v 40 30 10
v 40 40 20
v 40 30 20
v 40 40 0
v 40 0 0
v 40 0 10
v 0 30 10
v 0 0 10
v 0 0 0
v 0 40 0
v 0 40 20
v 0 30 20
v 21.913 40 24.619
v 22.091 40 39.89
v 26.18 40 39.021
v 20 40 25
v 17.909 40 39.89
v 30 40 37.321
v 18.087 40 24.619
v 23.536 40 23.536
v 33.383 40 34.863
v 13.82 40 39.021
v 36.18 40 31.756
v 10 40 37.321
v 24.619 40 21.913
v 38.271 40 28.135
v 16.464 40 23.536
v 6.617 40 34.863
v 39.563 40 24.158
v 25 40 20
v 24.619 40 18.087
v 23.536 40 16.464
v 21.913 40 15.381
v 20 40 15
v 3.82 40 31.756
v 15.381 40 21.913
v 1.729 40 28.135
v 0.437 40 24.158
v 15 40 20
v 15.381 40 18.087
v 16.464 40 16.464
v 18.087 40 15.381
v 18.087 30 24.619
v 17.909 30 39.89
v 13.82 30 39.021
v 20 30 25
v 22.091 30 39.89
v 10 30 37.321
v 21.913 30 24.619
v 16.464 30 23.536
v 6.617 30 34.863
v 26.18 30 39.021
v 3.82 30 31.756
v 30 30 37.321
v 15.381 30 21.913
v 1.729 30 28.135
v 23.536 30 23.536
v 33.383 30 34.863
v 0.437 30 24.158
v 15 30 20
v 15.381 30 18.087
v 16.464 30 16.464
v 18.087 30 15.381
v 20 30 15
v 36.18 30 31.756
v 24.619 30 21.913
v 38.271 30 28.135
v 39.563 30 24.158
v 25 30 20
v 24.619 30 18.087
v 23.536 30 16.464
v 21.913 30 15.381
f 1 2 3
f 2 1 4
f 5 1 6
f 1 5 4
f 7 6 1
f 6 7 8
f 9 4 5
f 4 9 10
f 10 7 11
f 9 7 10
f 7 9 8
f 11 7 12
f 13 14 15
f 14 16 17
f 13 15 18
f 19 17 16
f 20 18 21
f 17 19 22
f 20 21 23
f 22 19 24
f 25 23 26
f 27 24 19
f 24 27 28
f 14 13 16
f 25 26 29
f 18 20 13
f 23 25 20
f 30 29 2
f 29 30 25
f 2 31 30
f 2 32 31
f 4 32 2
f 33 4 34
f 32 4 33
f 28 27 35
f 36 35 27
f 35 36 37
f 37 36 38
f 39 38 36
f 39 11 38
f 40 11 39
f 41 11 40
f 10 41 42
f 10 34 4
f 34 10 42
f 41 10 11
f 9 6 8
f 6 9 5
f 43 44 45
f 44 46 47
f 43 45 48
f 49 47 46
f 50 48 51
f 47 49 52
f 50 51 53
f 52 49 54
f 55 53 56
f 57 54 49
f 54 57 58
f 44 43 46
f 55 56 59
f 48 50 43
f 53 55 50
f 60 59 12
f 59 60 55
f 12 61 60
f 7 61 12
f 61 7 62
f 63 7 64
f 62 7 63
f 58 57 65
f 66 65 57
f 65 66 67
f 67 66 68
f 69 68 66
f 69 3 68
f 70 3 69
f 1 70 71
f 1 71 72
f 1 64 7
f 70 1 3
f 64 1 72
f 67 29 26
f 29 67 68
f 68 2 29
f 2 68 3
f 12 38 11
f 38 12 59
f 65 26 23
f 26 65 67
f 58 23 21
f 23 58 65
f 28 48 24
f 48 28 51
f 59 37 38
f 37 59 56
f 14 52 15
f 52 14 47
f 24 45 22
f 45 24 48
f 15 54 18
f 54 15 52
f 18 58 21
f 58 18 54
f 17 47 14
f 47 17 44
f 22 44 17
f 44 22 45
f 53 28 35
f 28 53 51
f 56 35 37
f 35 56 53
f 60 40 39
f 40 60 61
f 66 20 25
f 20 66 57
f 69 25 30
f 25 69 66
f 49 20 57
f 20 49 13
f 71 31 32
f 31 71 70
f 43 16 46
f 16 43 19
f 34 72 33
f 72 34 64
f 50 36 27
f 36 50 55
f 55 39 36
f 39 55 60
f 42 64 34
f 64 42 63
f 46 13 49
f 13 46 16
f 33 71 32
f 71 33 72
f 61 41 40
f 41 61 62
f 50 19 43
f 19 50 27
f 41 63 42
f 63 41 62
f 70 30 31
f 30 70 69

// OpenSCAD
difference(){
  union(){
    cube([40, 40, 10], center=false);
    translate([0, 30, 0]){
      cube([40, 10, 20], center=false);
    }
    translate([20, 40, 20]){
      rotate([90, 0, 0]){
        color([1,0.8,0]) {
          cylinder(r1=20, r2=20, h=10, center=false);
        }
      }
    }
  }
  translate([20, 40, 20]){
    rotate([90, 0, 0]){
      color([1,0.8,0]) {
        cylinder(r1=5, r2=5, h=20, center=false);
      }
    }
  }
}
